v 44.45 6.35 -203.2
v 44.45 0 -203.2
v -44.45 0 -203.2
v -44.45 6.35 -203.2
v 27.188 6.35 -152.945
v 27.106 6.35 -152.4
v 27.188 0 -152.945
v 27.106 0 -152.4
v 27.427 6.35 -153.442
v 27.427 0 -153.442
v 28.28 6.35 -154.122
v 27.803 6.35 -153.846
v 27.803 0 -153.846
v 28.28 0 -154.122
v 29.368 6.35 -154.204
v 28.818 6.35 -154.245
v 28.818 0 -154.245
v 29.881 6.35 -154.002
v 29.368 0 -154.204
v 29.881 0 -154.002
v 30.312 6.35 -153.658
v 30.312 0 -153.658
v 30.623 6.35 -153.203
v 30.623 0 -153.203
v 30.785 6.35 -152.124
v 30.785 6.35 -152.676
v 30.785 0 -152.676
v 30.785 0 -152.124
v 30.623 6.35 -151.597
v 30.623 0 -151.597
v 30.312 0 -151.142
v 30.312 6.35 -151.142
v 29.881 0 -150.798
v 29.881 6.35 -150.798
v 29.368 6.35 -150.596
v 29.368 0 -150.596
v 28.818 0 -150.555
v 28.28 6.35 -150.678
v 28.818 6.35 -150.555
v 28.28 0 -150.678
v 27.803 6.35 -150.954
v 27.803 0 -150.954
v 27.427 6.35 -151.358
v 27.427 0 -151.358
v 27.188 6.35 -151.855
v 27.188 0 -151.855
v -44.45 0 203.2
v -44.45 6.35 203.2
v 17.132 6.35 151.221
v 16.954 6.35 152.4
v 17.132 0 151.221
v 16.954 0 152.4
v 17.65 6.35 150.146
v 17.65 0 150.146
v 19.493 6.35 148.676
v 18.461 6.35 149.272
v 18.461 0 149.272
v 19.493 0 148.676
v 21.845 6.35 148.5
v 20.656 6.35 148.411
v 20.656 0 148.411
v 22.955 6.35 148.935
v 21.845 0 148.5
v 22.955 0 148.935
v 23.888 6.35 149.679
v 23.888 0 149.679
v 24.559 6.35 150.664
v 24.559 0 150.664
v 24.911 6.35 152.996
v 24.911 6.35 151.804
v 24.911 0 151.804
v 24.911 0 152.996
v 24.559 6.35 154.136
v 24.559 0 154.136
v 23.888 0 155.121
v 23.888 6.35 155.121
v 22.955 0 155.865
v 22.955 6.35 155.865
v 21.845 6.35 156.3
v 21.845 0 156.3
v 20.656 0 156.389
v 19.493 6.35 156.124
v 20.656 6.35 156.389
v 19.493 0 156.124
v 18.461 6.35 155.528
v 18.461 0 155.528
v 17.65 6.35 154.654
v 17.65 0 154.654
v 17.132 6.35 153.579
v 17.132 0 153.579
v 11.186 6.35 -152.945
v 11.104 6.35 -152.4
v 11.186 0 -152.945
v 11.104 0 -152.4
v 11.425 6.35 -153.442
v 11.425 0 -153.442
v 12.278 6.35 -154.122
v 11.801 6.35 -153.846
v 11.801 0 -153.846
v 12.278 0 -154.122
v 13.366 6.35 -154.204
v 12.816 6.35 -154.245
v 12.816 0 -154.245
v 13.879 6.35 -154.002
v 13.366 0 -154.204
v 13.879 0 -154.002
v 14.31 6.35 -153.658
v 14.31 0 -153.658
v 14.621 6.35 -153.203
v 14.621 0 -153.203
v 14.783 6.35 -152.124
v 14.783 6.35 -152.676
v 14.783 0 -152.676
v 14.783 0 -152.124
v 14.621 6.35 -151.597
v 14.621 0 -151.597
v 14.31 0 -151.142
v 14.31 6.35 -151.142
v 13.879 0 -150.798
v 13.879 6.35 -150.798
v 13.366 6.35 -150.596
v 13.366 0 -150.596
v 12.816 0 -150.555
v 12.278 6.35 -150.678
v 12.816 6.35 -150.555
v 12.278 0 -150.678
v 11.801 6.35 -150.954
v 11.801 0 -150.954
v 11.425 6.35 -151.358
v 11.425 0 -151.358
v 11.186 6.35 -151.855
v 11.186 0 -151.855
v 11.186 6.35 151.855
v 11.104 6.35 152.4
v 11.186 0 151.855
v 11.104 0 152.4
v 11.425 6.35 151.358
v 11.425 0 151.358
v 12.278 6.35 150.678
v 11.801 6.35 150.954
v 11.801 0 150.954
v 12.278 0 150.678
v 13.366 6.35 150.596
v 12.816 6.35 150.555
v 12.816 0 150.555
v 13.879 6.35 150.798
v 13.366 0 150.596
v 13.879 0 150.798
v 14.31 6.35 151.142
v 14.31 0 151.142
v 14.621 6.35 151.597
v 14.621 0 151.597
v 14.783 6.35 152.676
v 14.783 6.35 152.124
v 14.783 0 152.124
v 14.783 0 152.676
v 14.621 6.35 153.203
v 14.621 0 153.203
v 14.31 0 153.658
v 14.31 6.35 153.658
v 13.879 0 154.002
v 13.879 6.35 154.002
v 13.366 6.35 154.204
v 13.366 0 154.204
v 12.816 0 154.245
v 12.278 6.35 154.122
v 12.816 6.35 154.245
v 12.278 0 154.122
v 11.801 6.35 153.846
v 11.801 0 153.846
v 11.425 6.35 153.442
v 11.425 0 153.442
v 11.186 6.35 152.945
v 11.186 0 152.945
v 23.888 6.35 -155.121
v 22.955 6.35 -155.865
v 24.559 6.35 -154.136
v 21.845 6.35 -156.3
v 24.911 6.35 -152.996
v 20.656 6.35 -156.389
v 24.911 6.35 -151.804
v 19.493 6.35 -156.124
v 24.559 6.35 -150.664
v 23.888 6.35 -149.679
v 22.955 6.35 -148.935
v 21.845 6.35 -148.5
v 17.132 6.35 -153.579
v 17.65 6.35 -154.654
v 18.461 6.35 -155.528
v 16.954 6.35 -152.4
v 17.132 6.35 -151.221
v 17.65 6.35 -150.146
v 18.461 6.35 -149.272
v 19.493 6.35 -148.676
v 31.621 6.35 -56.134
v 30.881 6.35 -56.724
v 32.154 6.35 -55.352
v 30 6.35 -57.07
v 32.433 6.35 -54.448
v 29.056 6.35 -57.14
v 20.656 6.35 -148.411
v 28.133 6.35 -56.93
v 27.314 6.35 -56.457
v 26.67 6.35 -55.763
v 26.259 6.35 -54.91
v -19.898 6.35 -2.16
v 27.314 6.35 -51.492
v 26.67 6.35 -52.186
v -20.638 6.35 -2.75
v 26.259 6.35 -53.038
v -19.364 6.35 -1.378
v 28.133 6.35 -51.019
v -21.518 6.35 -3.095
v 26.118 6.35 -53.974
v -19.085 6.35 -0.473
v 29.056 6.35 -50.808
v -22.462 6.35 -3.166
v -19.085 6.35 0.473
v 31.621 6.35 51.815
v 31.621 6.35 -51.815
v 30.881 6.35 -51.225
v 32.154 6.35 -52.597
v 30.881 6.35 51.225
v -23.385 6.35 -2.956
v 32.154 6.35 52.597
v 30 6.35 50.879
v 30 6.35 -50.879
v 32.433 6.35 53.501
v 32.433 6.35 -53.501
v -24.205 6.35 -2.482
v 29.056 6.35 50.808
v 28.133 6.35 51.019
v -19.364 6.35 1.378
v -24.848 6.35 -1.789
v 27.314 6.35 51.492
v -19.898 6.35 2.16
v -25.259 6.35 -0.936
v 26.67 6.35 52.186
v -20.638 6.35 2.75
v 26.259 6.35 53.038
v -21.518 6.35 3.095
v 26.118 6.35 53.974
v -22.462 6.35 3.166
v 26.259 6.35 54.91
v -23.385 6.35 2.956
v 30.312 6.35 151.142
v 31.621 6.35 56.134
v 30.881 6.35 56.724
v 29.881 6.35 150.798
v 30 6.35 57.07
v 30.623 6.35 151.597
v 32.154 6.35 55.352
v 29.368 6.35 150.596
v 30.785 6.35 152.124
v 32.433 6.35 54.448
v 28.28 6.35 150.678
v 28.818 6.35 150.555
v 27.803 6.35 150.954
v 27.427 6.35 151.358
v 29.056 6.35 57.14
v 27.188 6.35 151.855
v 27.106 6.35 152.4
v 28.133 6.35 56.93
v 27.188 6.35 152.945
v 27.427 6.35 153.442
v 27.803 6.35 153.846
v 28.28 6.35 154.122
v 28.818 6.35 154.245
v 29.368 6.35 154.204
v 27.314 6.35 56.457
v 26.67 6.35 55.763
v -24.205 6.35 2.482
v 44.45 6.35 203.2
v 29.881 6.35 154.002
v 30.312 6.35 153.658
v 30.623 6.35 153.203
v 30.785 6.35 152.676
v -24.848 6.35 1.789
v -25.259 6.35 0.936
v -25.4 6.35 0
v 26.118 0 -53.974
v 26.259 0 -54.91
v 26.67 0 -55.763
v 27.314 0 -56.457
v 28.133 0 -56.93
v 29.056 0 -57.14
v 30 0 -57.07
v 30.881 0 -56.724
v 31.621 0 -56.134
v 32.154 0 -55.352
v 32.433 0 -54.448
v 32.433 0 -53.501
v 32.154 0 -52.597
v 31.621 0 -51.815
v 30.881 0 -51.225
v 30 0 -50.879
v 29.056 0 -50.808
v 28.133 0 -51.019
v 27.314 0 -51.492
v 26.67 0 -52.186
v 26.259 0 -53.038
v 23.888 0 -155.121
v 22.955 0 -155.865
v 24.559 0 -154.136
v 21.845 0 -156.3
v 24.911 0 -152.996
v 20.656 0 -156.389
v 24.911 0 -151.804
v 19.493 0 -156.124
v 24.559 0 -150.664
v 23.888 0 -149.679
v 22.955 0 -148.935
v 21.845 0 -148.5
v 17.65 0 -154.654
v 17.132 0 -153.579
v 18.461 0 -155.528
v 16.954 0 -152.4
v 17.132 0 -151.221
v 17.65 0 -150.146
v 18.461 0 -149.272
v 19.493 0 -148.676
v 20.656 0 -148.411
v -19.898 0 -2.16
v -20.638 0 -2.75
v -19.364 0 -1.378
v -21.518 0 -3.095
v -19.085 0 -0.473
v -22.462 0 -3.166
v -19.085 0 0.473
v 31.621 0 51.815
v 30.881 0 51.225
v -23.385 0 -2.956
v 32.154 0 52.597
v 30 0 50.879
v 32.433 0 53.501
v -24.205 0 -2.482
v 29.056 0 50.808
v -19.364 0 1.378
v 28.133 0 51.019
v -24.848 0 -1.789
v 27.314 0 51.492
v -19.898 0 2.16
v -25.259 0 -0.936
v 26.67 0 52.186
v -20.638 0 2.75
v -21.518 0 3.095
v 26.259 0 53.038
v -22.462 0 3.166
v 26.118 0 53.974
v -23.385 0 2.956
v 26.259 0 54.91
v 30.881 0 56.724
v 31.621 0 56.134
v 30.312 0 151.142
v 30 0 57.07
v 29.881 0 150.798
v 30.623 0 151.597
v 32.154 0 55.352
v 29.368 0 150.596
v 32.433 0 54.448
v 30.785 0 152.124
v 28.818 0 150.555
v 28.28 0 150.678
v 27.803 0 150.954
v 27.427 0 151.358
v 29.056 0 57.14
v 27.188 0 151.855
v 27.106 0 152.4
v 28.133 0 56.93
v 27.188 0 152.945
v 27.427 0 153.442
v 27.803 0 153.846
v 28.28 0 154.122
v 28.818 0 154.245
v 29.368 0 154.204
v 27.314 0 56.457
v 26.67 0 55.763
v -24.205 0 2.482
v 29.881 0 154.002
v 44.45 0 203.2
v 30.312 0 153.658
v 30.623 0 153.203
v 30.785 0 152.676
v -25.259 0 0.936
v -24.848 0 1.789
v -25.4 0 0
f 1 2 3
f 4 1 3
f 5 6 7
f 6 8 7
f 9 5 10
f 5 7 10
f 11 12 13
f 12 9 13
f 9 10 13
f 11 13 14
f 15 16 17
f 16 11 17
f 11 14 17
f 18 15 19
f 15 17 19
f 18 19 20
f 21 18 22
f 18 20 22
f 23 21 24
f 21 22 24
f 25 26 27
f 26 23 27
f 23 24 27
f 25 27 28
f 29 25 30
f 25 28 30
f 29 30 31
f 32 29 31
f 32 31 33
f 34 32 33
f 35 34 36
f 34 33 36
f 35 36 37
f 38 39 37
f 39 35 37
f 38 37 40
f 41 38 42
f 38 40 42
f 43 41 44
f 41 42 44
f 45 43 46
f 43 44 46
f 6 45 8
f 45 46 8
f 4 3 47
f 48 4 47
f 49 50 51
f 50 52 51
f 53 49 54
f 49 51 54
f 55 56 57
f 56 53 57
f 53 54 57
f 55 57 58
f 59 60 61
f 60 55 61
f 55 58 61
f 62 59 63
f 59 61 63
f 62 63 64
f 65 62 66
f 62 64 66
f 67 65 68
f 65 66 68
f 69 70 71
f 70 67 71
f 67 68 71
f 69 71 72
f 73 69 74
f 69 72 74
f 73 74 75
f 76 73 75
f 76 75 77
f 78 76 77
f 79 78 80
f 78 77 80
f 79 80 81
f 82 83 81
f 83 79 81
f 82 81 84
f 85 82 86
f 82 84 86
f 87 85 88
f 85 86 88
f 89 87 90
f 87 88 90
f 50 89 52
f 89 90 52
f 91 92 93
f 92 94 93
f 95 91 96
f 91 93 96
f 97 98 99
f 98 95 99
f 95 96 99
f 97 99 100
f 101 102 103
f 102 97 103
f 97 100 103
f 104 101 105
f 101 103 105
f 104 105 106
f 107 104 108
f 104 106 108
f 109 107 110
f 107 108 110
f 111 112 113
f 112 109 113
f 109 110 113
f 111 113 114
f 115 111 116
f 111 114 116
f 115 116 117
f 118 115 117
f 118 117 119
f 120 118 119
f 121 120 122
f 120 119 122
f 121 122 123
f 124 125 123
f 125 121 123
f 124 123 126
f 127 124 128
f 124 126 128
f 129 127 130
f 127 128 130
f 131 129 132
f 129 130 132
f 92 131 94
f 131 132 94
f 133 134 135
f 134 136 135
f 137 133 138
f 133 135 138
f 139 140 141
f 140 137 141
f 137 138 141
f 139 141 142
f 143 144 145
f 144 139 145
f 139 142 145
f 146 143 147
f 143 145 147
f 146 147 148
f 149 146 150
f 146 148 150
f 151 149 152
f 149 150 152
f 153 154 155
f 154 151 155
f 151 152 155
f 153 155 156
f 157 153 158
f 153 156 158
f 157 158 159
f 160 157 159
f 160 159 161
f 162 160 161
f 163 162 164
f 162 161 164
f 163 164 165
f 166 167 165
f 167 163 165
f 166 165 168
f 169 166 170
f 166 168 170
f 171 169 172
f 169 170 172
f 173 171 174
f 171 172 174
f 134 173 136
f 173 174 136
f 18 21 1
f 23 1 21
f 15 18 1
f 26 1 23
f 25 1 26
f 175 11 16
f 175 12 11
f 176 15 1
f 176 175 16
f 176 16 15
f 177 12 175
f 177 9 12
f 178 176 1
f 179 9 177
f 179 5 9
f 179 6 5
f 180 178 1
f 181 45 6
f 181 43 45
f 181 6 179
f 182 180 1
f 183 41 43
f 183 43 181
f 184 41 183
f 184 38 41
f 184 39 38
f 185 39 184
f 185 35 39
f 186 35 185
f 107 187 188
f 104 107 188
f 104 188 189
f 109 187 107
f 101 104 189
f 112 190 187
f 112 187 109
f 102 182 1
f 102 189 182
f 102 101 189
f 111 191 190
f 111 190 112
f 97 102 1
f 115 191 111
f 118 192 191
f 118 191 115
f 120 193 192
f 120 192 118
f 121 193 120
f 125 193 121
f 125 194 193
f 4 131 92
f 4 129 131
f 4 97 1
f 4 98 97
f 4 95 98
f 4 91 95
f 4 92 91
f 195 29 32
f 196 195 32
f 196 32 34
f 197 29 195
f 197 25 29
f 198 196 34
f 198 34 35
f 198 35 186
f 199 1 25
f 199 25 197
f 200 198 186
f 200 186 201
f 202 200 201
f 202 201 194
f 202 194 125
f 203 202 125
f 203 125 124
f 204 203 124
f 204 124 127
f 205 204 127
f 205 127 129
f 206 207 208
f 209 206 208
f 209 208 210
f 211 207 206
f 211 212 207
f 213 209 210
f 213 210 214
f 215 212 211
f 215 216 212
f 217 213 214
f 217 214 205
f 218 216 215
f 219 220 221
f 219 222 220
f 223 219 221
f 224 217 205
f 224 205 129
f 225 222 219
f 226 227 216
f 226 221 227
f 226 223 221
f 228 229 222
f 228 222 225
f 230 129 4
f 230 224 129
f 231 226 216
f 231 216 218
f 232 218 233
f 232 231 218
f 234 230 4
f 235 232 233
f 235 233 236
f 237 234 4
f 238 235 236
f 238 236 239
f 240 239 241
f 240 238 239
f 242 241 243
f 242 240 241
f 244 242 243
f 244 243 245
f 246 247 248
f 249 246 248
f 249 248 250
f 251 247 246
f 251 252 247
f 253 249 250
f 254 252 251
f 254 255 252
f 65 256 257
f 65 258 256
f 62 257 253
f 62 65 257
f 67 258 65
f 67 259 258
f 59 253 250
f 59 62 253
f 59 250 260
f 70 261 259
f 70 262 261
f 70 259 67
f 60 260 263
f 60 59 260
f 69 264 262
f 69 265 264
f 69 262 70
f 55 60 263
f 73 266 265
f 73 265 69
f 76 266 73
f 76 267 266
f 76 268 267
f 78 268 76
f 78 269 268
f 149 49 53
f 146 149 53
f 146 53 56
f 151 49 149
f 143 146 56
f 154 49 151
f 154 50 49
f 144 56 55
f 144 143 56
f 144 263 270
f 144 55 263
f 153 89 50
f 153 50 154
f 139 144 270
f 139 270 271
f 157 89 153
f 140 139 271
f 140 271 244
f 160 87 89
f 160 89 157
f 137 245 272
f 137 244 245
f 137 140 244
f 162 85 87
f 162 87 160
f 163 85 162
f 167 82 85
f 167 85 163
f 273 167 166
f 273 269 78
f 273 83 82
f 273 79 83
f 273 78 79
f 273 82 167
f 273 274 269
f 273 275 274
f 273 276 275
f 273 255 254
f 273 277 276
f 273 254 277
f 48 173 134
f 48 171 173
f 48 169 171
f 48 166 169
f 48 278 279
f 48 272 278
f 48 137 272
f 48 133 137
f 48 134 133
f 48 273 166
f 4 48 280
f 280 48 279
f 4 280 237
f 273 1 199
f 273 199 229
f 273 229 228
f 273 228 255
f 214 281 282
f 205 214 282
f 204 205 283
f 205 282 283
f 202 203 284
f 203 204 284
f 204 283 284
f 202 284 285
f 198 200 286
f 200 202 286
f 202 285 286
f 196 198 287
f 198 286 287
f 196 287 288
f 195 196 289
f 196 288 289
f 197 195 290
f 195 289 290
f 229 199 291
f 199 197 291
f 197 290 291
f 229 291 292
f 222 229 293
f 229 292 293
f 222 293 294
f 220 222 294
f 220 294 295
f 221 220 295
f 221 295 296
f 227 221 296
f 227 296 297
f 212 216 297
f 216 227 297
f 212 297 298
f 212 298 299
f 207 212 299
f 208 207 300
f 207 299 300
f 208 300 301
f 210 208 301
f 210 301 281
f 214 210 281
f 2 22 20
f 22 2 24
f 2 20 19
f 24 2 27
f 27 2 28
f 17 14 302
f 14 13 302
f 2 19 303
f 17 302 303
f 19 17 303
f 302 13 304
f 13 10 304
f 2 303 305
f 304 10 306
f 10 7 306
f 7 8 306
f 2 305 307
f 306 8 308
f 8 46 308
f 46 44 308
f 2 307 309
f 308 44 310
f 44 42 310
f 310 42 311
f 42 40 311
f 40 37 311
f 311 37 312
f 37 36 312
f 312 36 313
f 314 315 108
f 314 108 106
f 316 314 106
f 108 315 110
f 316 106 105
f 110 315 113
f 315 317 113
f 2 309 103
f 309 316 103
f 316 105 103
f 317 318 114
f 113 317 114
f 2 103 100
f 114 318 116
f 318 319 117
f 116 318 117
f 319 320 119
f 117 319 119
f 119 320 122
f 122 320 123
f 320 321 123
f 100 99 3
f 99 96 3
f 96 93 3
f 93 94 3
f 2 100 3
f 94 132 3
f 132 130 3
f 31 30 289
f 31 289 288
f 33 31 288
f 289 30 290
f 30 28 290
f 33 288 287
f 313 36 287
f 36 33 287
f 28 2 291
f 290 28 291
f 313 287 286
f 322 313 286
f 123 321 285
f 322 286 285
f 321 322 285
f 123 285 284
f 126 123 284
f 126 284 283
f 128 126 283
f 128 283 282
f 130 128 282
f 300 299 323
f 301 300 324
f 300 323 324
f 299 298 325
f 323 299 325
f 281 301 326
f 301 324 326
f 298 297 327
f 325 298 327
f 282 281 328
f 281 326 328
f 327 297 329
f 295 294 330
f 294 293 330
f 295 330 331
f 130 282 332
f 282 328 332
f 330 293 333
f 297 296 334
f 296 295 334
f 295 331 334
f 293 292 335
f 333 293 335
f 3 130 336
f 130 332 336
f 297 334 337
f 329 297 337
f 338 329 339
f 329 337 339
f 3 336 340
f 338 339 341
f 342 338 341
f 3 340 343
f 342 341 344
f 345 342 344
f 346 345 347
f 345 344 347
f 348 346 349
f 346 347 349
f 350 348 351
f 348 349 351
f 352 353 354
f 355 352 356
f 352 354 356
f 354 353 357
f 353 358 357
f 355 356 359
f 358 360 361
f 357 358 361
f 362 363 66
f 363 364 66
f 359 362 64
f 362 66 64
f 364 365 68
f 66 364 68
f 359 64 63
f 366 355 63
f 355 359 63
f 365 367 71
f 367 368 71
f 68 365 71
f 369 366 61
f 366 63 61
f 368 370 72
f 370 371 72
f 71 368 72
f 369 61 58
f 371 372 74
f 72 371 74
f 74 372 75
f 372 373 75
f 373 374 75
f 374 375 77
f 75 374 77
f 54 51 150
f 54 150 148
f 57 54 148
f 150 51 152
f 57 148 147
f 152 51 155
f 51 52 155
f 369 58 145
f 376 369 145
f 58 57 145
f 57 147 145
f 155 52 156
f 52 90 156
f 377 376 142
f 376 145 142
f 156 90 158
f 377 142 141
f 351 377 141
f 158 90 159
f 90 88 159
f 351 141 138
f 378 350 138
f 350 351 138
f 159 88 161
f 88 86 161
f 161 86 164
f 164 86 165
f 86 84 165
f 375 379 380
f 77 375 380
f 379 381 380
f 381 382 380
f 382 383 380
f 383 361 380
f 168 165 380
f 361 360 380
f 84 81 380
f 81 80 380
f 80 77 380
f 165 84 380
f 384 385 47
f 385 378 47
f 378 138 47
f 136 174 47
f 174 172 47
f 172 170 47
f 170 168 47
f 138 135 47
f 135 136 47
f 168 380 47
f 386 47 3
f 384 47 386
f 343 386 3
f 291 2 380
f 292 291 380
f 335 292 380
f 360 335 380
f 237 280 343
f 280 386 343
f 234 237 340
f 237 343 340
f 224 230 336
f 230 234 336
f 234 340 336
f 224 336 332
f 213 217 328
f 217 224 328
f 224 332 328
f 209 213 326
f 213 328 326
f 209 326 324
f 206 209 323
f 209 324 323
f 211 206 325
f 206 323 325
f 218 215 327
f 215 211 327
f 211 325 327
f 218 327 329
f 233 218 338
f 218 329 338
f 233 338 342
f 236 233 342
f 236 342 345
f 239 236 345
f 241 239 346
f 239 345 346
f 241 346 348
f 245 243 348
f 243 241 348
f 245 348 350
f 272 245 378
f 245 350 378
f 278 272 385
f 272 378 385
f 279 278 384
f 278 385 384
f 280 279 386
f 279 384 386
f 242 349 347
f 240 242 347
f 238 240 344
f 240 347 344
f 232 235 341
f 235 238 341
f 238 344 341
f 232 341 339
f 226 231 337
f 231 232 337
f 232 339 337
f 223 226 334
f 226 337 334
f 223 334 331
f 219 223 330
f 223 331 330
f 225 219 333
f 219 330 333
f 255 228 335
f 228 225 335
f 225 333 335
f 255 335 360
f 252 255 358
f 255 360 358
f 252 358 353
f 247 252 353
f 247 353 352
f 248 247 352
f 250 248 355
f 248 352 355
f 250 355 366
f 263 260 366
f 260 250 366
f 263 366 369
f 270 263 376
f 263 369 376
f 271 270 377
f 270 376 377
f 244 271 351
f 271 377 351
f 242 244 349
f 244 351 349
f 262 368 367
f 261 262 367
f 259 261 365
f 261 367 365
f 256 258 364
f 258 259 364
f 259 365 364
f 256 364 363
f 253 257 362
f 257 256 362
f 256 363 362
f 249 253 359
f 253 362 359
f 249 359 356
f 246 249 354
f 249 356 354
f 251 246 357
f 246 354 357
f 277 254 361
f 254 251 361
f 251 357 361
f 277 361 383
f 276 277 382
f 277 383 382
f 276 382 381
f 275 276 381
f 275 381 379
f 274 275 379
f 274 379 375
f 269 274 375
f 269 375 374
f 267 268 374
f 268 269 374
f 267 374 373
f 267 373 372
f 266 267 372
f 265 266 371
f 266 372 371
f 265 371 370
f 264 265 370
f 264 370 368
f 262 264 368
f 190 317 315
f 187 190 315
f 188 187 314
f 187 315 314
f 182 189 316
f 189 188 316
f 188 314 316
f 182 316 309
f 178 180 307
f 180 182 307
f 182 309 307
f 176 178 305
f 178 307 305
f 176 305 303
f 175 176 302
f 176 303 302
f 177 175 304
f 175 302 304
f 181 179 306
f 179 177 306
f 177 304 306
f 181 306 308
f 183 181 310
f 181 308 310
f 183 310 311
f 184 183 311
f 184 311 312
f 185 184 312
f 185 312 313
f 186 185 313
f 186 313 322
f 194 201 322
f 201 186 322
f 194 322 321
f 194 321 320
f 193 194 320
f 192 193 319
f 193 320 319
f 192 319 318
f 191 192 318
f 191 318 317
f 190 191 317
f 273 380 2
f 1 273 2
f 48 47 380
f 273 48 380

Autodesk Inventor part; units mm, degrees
ref_plane "YZ Plane" through (0, 0, 0) normal (1, 0, 0) x (0, 1, 0)
ref_plane "XZ Plane" through (0, 0, 0) normal (0, 1, 0) x (-1, 0, 0)
ref_plane "XY Plane" through (0, 0, 0) normal (0, 0, 1) x (1, 0, 0)
sketch "Sketch1" plane through (0, 0, 0) normal (0, 1, 0) x (-1, 0, 0)
  line L0 (44.45, 203.2) -> (-44.45, 203.2)
  line L1 (-44.45, 203.2) -> (-44.45, -203.2)
  line L2 (-44.45, -203.2) -> (44.45, -203.2)
  line L3 (44.45, -203.2) -> (44.45, 203.2)
  line L4 (44.45, 203.2) -> (-44.45, -203.2) construction
  line L5 (-44.45, 203.2) -> (-20.955, 203.2)
  line L6 (-44.45, 88.9) -> (-44.45, 203.2)
  line L7 (44.45, 203.2) -> (44.45, 111.6492)
  line L8 (44.45, 203.2) -> (44.45, 38.1)
  line L9 (44.45, 38.1) -> (22.225, 38.1) construction
  line L10 (0, 88.9) -> (0, 203.2) construction
  line L11 (0, 203.2) -> (-66.675, 203.2)
  line L12 (-66.675, 203.2) -> (-66.675, 88.9) construction
  line L13 (-66.675, 203.2) -> (-66.675, 209.55) construction
  line L14 (-66.675, 209.55) -> (32.5679, 44.312) construction
  line L15 (-20.955, 88.9) -> (-20.955, 152.4) construction
  circle A0 centre (-20.955, 152.4) radius 8.001 construction
  circle A1 centre (-20.955, 152.4) radius 4.0005
  circle A2 centre (-20.955, 160.401) radius 1.85
  line L16 (42.545, 152.4) -> (-20.955, 152.4) construction
  circle A3 centre (-28.956, 152.4) radius 1.85
  line L17 (-20.955, 215.9) -> (-20.955, 152.4) construction
  circle A4 centre (-20.955, 144.399) radius 1.85
  line L18 (-84.455, 152.4) -> (-20.955, 152.4) construction
  circle A5 centre (-12.954, 152.4) radius 1.85
  line L19 (44.45, 0) -> (-44.45, 0) construction
  circle A6 centre (22.225, 0) radius 3.175
  circle A7 centre (-29.2932, 53.9743) radius 3.175
  line L20 (32.5679, 44.312) -> (22.7595, 60.6429) construction
  circle A8 centre (-20.955, -152.4) radius 4.0005
  circle A9 centre (-28.956, -152.4) radius 1.85
  circle A10 centre (-12.954, -152.4) radius 1.85
  circle A11 centre (-29.2932, -53.9743) radius 3.175
  point P0 (0, 0)
  point P1 (-20.955, 88.9)
  dimension "d19" = 16.002
  dimension "d0" = 88.9
  dimension "d1" = 406.4
  dimension "d5" = 165.1
  dimension "d6" = 22.225
  dimension "d10" = 6.35
  dimension "d20" = 8.001
  dimension "d21" = 3.7
  dimension "d24" = 360
  dimension "d30" = 6.35
  dimension "d31" = 6.35
  dimension "d32" = 19.05
extrude "Extrusion4" add sketch "Sketch1" along normal blind 6.35 contours L3 L2 L1 L0 | A2 | A4
properties part number "ChassisSideplate10"
